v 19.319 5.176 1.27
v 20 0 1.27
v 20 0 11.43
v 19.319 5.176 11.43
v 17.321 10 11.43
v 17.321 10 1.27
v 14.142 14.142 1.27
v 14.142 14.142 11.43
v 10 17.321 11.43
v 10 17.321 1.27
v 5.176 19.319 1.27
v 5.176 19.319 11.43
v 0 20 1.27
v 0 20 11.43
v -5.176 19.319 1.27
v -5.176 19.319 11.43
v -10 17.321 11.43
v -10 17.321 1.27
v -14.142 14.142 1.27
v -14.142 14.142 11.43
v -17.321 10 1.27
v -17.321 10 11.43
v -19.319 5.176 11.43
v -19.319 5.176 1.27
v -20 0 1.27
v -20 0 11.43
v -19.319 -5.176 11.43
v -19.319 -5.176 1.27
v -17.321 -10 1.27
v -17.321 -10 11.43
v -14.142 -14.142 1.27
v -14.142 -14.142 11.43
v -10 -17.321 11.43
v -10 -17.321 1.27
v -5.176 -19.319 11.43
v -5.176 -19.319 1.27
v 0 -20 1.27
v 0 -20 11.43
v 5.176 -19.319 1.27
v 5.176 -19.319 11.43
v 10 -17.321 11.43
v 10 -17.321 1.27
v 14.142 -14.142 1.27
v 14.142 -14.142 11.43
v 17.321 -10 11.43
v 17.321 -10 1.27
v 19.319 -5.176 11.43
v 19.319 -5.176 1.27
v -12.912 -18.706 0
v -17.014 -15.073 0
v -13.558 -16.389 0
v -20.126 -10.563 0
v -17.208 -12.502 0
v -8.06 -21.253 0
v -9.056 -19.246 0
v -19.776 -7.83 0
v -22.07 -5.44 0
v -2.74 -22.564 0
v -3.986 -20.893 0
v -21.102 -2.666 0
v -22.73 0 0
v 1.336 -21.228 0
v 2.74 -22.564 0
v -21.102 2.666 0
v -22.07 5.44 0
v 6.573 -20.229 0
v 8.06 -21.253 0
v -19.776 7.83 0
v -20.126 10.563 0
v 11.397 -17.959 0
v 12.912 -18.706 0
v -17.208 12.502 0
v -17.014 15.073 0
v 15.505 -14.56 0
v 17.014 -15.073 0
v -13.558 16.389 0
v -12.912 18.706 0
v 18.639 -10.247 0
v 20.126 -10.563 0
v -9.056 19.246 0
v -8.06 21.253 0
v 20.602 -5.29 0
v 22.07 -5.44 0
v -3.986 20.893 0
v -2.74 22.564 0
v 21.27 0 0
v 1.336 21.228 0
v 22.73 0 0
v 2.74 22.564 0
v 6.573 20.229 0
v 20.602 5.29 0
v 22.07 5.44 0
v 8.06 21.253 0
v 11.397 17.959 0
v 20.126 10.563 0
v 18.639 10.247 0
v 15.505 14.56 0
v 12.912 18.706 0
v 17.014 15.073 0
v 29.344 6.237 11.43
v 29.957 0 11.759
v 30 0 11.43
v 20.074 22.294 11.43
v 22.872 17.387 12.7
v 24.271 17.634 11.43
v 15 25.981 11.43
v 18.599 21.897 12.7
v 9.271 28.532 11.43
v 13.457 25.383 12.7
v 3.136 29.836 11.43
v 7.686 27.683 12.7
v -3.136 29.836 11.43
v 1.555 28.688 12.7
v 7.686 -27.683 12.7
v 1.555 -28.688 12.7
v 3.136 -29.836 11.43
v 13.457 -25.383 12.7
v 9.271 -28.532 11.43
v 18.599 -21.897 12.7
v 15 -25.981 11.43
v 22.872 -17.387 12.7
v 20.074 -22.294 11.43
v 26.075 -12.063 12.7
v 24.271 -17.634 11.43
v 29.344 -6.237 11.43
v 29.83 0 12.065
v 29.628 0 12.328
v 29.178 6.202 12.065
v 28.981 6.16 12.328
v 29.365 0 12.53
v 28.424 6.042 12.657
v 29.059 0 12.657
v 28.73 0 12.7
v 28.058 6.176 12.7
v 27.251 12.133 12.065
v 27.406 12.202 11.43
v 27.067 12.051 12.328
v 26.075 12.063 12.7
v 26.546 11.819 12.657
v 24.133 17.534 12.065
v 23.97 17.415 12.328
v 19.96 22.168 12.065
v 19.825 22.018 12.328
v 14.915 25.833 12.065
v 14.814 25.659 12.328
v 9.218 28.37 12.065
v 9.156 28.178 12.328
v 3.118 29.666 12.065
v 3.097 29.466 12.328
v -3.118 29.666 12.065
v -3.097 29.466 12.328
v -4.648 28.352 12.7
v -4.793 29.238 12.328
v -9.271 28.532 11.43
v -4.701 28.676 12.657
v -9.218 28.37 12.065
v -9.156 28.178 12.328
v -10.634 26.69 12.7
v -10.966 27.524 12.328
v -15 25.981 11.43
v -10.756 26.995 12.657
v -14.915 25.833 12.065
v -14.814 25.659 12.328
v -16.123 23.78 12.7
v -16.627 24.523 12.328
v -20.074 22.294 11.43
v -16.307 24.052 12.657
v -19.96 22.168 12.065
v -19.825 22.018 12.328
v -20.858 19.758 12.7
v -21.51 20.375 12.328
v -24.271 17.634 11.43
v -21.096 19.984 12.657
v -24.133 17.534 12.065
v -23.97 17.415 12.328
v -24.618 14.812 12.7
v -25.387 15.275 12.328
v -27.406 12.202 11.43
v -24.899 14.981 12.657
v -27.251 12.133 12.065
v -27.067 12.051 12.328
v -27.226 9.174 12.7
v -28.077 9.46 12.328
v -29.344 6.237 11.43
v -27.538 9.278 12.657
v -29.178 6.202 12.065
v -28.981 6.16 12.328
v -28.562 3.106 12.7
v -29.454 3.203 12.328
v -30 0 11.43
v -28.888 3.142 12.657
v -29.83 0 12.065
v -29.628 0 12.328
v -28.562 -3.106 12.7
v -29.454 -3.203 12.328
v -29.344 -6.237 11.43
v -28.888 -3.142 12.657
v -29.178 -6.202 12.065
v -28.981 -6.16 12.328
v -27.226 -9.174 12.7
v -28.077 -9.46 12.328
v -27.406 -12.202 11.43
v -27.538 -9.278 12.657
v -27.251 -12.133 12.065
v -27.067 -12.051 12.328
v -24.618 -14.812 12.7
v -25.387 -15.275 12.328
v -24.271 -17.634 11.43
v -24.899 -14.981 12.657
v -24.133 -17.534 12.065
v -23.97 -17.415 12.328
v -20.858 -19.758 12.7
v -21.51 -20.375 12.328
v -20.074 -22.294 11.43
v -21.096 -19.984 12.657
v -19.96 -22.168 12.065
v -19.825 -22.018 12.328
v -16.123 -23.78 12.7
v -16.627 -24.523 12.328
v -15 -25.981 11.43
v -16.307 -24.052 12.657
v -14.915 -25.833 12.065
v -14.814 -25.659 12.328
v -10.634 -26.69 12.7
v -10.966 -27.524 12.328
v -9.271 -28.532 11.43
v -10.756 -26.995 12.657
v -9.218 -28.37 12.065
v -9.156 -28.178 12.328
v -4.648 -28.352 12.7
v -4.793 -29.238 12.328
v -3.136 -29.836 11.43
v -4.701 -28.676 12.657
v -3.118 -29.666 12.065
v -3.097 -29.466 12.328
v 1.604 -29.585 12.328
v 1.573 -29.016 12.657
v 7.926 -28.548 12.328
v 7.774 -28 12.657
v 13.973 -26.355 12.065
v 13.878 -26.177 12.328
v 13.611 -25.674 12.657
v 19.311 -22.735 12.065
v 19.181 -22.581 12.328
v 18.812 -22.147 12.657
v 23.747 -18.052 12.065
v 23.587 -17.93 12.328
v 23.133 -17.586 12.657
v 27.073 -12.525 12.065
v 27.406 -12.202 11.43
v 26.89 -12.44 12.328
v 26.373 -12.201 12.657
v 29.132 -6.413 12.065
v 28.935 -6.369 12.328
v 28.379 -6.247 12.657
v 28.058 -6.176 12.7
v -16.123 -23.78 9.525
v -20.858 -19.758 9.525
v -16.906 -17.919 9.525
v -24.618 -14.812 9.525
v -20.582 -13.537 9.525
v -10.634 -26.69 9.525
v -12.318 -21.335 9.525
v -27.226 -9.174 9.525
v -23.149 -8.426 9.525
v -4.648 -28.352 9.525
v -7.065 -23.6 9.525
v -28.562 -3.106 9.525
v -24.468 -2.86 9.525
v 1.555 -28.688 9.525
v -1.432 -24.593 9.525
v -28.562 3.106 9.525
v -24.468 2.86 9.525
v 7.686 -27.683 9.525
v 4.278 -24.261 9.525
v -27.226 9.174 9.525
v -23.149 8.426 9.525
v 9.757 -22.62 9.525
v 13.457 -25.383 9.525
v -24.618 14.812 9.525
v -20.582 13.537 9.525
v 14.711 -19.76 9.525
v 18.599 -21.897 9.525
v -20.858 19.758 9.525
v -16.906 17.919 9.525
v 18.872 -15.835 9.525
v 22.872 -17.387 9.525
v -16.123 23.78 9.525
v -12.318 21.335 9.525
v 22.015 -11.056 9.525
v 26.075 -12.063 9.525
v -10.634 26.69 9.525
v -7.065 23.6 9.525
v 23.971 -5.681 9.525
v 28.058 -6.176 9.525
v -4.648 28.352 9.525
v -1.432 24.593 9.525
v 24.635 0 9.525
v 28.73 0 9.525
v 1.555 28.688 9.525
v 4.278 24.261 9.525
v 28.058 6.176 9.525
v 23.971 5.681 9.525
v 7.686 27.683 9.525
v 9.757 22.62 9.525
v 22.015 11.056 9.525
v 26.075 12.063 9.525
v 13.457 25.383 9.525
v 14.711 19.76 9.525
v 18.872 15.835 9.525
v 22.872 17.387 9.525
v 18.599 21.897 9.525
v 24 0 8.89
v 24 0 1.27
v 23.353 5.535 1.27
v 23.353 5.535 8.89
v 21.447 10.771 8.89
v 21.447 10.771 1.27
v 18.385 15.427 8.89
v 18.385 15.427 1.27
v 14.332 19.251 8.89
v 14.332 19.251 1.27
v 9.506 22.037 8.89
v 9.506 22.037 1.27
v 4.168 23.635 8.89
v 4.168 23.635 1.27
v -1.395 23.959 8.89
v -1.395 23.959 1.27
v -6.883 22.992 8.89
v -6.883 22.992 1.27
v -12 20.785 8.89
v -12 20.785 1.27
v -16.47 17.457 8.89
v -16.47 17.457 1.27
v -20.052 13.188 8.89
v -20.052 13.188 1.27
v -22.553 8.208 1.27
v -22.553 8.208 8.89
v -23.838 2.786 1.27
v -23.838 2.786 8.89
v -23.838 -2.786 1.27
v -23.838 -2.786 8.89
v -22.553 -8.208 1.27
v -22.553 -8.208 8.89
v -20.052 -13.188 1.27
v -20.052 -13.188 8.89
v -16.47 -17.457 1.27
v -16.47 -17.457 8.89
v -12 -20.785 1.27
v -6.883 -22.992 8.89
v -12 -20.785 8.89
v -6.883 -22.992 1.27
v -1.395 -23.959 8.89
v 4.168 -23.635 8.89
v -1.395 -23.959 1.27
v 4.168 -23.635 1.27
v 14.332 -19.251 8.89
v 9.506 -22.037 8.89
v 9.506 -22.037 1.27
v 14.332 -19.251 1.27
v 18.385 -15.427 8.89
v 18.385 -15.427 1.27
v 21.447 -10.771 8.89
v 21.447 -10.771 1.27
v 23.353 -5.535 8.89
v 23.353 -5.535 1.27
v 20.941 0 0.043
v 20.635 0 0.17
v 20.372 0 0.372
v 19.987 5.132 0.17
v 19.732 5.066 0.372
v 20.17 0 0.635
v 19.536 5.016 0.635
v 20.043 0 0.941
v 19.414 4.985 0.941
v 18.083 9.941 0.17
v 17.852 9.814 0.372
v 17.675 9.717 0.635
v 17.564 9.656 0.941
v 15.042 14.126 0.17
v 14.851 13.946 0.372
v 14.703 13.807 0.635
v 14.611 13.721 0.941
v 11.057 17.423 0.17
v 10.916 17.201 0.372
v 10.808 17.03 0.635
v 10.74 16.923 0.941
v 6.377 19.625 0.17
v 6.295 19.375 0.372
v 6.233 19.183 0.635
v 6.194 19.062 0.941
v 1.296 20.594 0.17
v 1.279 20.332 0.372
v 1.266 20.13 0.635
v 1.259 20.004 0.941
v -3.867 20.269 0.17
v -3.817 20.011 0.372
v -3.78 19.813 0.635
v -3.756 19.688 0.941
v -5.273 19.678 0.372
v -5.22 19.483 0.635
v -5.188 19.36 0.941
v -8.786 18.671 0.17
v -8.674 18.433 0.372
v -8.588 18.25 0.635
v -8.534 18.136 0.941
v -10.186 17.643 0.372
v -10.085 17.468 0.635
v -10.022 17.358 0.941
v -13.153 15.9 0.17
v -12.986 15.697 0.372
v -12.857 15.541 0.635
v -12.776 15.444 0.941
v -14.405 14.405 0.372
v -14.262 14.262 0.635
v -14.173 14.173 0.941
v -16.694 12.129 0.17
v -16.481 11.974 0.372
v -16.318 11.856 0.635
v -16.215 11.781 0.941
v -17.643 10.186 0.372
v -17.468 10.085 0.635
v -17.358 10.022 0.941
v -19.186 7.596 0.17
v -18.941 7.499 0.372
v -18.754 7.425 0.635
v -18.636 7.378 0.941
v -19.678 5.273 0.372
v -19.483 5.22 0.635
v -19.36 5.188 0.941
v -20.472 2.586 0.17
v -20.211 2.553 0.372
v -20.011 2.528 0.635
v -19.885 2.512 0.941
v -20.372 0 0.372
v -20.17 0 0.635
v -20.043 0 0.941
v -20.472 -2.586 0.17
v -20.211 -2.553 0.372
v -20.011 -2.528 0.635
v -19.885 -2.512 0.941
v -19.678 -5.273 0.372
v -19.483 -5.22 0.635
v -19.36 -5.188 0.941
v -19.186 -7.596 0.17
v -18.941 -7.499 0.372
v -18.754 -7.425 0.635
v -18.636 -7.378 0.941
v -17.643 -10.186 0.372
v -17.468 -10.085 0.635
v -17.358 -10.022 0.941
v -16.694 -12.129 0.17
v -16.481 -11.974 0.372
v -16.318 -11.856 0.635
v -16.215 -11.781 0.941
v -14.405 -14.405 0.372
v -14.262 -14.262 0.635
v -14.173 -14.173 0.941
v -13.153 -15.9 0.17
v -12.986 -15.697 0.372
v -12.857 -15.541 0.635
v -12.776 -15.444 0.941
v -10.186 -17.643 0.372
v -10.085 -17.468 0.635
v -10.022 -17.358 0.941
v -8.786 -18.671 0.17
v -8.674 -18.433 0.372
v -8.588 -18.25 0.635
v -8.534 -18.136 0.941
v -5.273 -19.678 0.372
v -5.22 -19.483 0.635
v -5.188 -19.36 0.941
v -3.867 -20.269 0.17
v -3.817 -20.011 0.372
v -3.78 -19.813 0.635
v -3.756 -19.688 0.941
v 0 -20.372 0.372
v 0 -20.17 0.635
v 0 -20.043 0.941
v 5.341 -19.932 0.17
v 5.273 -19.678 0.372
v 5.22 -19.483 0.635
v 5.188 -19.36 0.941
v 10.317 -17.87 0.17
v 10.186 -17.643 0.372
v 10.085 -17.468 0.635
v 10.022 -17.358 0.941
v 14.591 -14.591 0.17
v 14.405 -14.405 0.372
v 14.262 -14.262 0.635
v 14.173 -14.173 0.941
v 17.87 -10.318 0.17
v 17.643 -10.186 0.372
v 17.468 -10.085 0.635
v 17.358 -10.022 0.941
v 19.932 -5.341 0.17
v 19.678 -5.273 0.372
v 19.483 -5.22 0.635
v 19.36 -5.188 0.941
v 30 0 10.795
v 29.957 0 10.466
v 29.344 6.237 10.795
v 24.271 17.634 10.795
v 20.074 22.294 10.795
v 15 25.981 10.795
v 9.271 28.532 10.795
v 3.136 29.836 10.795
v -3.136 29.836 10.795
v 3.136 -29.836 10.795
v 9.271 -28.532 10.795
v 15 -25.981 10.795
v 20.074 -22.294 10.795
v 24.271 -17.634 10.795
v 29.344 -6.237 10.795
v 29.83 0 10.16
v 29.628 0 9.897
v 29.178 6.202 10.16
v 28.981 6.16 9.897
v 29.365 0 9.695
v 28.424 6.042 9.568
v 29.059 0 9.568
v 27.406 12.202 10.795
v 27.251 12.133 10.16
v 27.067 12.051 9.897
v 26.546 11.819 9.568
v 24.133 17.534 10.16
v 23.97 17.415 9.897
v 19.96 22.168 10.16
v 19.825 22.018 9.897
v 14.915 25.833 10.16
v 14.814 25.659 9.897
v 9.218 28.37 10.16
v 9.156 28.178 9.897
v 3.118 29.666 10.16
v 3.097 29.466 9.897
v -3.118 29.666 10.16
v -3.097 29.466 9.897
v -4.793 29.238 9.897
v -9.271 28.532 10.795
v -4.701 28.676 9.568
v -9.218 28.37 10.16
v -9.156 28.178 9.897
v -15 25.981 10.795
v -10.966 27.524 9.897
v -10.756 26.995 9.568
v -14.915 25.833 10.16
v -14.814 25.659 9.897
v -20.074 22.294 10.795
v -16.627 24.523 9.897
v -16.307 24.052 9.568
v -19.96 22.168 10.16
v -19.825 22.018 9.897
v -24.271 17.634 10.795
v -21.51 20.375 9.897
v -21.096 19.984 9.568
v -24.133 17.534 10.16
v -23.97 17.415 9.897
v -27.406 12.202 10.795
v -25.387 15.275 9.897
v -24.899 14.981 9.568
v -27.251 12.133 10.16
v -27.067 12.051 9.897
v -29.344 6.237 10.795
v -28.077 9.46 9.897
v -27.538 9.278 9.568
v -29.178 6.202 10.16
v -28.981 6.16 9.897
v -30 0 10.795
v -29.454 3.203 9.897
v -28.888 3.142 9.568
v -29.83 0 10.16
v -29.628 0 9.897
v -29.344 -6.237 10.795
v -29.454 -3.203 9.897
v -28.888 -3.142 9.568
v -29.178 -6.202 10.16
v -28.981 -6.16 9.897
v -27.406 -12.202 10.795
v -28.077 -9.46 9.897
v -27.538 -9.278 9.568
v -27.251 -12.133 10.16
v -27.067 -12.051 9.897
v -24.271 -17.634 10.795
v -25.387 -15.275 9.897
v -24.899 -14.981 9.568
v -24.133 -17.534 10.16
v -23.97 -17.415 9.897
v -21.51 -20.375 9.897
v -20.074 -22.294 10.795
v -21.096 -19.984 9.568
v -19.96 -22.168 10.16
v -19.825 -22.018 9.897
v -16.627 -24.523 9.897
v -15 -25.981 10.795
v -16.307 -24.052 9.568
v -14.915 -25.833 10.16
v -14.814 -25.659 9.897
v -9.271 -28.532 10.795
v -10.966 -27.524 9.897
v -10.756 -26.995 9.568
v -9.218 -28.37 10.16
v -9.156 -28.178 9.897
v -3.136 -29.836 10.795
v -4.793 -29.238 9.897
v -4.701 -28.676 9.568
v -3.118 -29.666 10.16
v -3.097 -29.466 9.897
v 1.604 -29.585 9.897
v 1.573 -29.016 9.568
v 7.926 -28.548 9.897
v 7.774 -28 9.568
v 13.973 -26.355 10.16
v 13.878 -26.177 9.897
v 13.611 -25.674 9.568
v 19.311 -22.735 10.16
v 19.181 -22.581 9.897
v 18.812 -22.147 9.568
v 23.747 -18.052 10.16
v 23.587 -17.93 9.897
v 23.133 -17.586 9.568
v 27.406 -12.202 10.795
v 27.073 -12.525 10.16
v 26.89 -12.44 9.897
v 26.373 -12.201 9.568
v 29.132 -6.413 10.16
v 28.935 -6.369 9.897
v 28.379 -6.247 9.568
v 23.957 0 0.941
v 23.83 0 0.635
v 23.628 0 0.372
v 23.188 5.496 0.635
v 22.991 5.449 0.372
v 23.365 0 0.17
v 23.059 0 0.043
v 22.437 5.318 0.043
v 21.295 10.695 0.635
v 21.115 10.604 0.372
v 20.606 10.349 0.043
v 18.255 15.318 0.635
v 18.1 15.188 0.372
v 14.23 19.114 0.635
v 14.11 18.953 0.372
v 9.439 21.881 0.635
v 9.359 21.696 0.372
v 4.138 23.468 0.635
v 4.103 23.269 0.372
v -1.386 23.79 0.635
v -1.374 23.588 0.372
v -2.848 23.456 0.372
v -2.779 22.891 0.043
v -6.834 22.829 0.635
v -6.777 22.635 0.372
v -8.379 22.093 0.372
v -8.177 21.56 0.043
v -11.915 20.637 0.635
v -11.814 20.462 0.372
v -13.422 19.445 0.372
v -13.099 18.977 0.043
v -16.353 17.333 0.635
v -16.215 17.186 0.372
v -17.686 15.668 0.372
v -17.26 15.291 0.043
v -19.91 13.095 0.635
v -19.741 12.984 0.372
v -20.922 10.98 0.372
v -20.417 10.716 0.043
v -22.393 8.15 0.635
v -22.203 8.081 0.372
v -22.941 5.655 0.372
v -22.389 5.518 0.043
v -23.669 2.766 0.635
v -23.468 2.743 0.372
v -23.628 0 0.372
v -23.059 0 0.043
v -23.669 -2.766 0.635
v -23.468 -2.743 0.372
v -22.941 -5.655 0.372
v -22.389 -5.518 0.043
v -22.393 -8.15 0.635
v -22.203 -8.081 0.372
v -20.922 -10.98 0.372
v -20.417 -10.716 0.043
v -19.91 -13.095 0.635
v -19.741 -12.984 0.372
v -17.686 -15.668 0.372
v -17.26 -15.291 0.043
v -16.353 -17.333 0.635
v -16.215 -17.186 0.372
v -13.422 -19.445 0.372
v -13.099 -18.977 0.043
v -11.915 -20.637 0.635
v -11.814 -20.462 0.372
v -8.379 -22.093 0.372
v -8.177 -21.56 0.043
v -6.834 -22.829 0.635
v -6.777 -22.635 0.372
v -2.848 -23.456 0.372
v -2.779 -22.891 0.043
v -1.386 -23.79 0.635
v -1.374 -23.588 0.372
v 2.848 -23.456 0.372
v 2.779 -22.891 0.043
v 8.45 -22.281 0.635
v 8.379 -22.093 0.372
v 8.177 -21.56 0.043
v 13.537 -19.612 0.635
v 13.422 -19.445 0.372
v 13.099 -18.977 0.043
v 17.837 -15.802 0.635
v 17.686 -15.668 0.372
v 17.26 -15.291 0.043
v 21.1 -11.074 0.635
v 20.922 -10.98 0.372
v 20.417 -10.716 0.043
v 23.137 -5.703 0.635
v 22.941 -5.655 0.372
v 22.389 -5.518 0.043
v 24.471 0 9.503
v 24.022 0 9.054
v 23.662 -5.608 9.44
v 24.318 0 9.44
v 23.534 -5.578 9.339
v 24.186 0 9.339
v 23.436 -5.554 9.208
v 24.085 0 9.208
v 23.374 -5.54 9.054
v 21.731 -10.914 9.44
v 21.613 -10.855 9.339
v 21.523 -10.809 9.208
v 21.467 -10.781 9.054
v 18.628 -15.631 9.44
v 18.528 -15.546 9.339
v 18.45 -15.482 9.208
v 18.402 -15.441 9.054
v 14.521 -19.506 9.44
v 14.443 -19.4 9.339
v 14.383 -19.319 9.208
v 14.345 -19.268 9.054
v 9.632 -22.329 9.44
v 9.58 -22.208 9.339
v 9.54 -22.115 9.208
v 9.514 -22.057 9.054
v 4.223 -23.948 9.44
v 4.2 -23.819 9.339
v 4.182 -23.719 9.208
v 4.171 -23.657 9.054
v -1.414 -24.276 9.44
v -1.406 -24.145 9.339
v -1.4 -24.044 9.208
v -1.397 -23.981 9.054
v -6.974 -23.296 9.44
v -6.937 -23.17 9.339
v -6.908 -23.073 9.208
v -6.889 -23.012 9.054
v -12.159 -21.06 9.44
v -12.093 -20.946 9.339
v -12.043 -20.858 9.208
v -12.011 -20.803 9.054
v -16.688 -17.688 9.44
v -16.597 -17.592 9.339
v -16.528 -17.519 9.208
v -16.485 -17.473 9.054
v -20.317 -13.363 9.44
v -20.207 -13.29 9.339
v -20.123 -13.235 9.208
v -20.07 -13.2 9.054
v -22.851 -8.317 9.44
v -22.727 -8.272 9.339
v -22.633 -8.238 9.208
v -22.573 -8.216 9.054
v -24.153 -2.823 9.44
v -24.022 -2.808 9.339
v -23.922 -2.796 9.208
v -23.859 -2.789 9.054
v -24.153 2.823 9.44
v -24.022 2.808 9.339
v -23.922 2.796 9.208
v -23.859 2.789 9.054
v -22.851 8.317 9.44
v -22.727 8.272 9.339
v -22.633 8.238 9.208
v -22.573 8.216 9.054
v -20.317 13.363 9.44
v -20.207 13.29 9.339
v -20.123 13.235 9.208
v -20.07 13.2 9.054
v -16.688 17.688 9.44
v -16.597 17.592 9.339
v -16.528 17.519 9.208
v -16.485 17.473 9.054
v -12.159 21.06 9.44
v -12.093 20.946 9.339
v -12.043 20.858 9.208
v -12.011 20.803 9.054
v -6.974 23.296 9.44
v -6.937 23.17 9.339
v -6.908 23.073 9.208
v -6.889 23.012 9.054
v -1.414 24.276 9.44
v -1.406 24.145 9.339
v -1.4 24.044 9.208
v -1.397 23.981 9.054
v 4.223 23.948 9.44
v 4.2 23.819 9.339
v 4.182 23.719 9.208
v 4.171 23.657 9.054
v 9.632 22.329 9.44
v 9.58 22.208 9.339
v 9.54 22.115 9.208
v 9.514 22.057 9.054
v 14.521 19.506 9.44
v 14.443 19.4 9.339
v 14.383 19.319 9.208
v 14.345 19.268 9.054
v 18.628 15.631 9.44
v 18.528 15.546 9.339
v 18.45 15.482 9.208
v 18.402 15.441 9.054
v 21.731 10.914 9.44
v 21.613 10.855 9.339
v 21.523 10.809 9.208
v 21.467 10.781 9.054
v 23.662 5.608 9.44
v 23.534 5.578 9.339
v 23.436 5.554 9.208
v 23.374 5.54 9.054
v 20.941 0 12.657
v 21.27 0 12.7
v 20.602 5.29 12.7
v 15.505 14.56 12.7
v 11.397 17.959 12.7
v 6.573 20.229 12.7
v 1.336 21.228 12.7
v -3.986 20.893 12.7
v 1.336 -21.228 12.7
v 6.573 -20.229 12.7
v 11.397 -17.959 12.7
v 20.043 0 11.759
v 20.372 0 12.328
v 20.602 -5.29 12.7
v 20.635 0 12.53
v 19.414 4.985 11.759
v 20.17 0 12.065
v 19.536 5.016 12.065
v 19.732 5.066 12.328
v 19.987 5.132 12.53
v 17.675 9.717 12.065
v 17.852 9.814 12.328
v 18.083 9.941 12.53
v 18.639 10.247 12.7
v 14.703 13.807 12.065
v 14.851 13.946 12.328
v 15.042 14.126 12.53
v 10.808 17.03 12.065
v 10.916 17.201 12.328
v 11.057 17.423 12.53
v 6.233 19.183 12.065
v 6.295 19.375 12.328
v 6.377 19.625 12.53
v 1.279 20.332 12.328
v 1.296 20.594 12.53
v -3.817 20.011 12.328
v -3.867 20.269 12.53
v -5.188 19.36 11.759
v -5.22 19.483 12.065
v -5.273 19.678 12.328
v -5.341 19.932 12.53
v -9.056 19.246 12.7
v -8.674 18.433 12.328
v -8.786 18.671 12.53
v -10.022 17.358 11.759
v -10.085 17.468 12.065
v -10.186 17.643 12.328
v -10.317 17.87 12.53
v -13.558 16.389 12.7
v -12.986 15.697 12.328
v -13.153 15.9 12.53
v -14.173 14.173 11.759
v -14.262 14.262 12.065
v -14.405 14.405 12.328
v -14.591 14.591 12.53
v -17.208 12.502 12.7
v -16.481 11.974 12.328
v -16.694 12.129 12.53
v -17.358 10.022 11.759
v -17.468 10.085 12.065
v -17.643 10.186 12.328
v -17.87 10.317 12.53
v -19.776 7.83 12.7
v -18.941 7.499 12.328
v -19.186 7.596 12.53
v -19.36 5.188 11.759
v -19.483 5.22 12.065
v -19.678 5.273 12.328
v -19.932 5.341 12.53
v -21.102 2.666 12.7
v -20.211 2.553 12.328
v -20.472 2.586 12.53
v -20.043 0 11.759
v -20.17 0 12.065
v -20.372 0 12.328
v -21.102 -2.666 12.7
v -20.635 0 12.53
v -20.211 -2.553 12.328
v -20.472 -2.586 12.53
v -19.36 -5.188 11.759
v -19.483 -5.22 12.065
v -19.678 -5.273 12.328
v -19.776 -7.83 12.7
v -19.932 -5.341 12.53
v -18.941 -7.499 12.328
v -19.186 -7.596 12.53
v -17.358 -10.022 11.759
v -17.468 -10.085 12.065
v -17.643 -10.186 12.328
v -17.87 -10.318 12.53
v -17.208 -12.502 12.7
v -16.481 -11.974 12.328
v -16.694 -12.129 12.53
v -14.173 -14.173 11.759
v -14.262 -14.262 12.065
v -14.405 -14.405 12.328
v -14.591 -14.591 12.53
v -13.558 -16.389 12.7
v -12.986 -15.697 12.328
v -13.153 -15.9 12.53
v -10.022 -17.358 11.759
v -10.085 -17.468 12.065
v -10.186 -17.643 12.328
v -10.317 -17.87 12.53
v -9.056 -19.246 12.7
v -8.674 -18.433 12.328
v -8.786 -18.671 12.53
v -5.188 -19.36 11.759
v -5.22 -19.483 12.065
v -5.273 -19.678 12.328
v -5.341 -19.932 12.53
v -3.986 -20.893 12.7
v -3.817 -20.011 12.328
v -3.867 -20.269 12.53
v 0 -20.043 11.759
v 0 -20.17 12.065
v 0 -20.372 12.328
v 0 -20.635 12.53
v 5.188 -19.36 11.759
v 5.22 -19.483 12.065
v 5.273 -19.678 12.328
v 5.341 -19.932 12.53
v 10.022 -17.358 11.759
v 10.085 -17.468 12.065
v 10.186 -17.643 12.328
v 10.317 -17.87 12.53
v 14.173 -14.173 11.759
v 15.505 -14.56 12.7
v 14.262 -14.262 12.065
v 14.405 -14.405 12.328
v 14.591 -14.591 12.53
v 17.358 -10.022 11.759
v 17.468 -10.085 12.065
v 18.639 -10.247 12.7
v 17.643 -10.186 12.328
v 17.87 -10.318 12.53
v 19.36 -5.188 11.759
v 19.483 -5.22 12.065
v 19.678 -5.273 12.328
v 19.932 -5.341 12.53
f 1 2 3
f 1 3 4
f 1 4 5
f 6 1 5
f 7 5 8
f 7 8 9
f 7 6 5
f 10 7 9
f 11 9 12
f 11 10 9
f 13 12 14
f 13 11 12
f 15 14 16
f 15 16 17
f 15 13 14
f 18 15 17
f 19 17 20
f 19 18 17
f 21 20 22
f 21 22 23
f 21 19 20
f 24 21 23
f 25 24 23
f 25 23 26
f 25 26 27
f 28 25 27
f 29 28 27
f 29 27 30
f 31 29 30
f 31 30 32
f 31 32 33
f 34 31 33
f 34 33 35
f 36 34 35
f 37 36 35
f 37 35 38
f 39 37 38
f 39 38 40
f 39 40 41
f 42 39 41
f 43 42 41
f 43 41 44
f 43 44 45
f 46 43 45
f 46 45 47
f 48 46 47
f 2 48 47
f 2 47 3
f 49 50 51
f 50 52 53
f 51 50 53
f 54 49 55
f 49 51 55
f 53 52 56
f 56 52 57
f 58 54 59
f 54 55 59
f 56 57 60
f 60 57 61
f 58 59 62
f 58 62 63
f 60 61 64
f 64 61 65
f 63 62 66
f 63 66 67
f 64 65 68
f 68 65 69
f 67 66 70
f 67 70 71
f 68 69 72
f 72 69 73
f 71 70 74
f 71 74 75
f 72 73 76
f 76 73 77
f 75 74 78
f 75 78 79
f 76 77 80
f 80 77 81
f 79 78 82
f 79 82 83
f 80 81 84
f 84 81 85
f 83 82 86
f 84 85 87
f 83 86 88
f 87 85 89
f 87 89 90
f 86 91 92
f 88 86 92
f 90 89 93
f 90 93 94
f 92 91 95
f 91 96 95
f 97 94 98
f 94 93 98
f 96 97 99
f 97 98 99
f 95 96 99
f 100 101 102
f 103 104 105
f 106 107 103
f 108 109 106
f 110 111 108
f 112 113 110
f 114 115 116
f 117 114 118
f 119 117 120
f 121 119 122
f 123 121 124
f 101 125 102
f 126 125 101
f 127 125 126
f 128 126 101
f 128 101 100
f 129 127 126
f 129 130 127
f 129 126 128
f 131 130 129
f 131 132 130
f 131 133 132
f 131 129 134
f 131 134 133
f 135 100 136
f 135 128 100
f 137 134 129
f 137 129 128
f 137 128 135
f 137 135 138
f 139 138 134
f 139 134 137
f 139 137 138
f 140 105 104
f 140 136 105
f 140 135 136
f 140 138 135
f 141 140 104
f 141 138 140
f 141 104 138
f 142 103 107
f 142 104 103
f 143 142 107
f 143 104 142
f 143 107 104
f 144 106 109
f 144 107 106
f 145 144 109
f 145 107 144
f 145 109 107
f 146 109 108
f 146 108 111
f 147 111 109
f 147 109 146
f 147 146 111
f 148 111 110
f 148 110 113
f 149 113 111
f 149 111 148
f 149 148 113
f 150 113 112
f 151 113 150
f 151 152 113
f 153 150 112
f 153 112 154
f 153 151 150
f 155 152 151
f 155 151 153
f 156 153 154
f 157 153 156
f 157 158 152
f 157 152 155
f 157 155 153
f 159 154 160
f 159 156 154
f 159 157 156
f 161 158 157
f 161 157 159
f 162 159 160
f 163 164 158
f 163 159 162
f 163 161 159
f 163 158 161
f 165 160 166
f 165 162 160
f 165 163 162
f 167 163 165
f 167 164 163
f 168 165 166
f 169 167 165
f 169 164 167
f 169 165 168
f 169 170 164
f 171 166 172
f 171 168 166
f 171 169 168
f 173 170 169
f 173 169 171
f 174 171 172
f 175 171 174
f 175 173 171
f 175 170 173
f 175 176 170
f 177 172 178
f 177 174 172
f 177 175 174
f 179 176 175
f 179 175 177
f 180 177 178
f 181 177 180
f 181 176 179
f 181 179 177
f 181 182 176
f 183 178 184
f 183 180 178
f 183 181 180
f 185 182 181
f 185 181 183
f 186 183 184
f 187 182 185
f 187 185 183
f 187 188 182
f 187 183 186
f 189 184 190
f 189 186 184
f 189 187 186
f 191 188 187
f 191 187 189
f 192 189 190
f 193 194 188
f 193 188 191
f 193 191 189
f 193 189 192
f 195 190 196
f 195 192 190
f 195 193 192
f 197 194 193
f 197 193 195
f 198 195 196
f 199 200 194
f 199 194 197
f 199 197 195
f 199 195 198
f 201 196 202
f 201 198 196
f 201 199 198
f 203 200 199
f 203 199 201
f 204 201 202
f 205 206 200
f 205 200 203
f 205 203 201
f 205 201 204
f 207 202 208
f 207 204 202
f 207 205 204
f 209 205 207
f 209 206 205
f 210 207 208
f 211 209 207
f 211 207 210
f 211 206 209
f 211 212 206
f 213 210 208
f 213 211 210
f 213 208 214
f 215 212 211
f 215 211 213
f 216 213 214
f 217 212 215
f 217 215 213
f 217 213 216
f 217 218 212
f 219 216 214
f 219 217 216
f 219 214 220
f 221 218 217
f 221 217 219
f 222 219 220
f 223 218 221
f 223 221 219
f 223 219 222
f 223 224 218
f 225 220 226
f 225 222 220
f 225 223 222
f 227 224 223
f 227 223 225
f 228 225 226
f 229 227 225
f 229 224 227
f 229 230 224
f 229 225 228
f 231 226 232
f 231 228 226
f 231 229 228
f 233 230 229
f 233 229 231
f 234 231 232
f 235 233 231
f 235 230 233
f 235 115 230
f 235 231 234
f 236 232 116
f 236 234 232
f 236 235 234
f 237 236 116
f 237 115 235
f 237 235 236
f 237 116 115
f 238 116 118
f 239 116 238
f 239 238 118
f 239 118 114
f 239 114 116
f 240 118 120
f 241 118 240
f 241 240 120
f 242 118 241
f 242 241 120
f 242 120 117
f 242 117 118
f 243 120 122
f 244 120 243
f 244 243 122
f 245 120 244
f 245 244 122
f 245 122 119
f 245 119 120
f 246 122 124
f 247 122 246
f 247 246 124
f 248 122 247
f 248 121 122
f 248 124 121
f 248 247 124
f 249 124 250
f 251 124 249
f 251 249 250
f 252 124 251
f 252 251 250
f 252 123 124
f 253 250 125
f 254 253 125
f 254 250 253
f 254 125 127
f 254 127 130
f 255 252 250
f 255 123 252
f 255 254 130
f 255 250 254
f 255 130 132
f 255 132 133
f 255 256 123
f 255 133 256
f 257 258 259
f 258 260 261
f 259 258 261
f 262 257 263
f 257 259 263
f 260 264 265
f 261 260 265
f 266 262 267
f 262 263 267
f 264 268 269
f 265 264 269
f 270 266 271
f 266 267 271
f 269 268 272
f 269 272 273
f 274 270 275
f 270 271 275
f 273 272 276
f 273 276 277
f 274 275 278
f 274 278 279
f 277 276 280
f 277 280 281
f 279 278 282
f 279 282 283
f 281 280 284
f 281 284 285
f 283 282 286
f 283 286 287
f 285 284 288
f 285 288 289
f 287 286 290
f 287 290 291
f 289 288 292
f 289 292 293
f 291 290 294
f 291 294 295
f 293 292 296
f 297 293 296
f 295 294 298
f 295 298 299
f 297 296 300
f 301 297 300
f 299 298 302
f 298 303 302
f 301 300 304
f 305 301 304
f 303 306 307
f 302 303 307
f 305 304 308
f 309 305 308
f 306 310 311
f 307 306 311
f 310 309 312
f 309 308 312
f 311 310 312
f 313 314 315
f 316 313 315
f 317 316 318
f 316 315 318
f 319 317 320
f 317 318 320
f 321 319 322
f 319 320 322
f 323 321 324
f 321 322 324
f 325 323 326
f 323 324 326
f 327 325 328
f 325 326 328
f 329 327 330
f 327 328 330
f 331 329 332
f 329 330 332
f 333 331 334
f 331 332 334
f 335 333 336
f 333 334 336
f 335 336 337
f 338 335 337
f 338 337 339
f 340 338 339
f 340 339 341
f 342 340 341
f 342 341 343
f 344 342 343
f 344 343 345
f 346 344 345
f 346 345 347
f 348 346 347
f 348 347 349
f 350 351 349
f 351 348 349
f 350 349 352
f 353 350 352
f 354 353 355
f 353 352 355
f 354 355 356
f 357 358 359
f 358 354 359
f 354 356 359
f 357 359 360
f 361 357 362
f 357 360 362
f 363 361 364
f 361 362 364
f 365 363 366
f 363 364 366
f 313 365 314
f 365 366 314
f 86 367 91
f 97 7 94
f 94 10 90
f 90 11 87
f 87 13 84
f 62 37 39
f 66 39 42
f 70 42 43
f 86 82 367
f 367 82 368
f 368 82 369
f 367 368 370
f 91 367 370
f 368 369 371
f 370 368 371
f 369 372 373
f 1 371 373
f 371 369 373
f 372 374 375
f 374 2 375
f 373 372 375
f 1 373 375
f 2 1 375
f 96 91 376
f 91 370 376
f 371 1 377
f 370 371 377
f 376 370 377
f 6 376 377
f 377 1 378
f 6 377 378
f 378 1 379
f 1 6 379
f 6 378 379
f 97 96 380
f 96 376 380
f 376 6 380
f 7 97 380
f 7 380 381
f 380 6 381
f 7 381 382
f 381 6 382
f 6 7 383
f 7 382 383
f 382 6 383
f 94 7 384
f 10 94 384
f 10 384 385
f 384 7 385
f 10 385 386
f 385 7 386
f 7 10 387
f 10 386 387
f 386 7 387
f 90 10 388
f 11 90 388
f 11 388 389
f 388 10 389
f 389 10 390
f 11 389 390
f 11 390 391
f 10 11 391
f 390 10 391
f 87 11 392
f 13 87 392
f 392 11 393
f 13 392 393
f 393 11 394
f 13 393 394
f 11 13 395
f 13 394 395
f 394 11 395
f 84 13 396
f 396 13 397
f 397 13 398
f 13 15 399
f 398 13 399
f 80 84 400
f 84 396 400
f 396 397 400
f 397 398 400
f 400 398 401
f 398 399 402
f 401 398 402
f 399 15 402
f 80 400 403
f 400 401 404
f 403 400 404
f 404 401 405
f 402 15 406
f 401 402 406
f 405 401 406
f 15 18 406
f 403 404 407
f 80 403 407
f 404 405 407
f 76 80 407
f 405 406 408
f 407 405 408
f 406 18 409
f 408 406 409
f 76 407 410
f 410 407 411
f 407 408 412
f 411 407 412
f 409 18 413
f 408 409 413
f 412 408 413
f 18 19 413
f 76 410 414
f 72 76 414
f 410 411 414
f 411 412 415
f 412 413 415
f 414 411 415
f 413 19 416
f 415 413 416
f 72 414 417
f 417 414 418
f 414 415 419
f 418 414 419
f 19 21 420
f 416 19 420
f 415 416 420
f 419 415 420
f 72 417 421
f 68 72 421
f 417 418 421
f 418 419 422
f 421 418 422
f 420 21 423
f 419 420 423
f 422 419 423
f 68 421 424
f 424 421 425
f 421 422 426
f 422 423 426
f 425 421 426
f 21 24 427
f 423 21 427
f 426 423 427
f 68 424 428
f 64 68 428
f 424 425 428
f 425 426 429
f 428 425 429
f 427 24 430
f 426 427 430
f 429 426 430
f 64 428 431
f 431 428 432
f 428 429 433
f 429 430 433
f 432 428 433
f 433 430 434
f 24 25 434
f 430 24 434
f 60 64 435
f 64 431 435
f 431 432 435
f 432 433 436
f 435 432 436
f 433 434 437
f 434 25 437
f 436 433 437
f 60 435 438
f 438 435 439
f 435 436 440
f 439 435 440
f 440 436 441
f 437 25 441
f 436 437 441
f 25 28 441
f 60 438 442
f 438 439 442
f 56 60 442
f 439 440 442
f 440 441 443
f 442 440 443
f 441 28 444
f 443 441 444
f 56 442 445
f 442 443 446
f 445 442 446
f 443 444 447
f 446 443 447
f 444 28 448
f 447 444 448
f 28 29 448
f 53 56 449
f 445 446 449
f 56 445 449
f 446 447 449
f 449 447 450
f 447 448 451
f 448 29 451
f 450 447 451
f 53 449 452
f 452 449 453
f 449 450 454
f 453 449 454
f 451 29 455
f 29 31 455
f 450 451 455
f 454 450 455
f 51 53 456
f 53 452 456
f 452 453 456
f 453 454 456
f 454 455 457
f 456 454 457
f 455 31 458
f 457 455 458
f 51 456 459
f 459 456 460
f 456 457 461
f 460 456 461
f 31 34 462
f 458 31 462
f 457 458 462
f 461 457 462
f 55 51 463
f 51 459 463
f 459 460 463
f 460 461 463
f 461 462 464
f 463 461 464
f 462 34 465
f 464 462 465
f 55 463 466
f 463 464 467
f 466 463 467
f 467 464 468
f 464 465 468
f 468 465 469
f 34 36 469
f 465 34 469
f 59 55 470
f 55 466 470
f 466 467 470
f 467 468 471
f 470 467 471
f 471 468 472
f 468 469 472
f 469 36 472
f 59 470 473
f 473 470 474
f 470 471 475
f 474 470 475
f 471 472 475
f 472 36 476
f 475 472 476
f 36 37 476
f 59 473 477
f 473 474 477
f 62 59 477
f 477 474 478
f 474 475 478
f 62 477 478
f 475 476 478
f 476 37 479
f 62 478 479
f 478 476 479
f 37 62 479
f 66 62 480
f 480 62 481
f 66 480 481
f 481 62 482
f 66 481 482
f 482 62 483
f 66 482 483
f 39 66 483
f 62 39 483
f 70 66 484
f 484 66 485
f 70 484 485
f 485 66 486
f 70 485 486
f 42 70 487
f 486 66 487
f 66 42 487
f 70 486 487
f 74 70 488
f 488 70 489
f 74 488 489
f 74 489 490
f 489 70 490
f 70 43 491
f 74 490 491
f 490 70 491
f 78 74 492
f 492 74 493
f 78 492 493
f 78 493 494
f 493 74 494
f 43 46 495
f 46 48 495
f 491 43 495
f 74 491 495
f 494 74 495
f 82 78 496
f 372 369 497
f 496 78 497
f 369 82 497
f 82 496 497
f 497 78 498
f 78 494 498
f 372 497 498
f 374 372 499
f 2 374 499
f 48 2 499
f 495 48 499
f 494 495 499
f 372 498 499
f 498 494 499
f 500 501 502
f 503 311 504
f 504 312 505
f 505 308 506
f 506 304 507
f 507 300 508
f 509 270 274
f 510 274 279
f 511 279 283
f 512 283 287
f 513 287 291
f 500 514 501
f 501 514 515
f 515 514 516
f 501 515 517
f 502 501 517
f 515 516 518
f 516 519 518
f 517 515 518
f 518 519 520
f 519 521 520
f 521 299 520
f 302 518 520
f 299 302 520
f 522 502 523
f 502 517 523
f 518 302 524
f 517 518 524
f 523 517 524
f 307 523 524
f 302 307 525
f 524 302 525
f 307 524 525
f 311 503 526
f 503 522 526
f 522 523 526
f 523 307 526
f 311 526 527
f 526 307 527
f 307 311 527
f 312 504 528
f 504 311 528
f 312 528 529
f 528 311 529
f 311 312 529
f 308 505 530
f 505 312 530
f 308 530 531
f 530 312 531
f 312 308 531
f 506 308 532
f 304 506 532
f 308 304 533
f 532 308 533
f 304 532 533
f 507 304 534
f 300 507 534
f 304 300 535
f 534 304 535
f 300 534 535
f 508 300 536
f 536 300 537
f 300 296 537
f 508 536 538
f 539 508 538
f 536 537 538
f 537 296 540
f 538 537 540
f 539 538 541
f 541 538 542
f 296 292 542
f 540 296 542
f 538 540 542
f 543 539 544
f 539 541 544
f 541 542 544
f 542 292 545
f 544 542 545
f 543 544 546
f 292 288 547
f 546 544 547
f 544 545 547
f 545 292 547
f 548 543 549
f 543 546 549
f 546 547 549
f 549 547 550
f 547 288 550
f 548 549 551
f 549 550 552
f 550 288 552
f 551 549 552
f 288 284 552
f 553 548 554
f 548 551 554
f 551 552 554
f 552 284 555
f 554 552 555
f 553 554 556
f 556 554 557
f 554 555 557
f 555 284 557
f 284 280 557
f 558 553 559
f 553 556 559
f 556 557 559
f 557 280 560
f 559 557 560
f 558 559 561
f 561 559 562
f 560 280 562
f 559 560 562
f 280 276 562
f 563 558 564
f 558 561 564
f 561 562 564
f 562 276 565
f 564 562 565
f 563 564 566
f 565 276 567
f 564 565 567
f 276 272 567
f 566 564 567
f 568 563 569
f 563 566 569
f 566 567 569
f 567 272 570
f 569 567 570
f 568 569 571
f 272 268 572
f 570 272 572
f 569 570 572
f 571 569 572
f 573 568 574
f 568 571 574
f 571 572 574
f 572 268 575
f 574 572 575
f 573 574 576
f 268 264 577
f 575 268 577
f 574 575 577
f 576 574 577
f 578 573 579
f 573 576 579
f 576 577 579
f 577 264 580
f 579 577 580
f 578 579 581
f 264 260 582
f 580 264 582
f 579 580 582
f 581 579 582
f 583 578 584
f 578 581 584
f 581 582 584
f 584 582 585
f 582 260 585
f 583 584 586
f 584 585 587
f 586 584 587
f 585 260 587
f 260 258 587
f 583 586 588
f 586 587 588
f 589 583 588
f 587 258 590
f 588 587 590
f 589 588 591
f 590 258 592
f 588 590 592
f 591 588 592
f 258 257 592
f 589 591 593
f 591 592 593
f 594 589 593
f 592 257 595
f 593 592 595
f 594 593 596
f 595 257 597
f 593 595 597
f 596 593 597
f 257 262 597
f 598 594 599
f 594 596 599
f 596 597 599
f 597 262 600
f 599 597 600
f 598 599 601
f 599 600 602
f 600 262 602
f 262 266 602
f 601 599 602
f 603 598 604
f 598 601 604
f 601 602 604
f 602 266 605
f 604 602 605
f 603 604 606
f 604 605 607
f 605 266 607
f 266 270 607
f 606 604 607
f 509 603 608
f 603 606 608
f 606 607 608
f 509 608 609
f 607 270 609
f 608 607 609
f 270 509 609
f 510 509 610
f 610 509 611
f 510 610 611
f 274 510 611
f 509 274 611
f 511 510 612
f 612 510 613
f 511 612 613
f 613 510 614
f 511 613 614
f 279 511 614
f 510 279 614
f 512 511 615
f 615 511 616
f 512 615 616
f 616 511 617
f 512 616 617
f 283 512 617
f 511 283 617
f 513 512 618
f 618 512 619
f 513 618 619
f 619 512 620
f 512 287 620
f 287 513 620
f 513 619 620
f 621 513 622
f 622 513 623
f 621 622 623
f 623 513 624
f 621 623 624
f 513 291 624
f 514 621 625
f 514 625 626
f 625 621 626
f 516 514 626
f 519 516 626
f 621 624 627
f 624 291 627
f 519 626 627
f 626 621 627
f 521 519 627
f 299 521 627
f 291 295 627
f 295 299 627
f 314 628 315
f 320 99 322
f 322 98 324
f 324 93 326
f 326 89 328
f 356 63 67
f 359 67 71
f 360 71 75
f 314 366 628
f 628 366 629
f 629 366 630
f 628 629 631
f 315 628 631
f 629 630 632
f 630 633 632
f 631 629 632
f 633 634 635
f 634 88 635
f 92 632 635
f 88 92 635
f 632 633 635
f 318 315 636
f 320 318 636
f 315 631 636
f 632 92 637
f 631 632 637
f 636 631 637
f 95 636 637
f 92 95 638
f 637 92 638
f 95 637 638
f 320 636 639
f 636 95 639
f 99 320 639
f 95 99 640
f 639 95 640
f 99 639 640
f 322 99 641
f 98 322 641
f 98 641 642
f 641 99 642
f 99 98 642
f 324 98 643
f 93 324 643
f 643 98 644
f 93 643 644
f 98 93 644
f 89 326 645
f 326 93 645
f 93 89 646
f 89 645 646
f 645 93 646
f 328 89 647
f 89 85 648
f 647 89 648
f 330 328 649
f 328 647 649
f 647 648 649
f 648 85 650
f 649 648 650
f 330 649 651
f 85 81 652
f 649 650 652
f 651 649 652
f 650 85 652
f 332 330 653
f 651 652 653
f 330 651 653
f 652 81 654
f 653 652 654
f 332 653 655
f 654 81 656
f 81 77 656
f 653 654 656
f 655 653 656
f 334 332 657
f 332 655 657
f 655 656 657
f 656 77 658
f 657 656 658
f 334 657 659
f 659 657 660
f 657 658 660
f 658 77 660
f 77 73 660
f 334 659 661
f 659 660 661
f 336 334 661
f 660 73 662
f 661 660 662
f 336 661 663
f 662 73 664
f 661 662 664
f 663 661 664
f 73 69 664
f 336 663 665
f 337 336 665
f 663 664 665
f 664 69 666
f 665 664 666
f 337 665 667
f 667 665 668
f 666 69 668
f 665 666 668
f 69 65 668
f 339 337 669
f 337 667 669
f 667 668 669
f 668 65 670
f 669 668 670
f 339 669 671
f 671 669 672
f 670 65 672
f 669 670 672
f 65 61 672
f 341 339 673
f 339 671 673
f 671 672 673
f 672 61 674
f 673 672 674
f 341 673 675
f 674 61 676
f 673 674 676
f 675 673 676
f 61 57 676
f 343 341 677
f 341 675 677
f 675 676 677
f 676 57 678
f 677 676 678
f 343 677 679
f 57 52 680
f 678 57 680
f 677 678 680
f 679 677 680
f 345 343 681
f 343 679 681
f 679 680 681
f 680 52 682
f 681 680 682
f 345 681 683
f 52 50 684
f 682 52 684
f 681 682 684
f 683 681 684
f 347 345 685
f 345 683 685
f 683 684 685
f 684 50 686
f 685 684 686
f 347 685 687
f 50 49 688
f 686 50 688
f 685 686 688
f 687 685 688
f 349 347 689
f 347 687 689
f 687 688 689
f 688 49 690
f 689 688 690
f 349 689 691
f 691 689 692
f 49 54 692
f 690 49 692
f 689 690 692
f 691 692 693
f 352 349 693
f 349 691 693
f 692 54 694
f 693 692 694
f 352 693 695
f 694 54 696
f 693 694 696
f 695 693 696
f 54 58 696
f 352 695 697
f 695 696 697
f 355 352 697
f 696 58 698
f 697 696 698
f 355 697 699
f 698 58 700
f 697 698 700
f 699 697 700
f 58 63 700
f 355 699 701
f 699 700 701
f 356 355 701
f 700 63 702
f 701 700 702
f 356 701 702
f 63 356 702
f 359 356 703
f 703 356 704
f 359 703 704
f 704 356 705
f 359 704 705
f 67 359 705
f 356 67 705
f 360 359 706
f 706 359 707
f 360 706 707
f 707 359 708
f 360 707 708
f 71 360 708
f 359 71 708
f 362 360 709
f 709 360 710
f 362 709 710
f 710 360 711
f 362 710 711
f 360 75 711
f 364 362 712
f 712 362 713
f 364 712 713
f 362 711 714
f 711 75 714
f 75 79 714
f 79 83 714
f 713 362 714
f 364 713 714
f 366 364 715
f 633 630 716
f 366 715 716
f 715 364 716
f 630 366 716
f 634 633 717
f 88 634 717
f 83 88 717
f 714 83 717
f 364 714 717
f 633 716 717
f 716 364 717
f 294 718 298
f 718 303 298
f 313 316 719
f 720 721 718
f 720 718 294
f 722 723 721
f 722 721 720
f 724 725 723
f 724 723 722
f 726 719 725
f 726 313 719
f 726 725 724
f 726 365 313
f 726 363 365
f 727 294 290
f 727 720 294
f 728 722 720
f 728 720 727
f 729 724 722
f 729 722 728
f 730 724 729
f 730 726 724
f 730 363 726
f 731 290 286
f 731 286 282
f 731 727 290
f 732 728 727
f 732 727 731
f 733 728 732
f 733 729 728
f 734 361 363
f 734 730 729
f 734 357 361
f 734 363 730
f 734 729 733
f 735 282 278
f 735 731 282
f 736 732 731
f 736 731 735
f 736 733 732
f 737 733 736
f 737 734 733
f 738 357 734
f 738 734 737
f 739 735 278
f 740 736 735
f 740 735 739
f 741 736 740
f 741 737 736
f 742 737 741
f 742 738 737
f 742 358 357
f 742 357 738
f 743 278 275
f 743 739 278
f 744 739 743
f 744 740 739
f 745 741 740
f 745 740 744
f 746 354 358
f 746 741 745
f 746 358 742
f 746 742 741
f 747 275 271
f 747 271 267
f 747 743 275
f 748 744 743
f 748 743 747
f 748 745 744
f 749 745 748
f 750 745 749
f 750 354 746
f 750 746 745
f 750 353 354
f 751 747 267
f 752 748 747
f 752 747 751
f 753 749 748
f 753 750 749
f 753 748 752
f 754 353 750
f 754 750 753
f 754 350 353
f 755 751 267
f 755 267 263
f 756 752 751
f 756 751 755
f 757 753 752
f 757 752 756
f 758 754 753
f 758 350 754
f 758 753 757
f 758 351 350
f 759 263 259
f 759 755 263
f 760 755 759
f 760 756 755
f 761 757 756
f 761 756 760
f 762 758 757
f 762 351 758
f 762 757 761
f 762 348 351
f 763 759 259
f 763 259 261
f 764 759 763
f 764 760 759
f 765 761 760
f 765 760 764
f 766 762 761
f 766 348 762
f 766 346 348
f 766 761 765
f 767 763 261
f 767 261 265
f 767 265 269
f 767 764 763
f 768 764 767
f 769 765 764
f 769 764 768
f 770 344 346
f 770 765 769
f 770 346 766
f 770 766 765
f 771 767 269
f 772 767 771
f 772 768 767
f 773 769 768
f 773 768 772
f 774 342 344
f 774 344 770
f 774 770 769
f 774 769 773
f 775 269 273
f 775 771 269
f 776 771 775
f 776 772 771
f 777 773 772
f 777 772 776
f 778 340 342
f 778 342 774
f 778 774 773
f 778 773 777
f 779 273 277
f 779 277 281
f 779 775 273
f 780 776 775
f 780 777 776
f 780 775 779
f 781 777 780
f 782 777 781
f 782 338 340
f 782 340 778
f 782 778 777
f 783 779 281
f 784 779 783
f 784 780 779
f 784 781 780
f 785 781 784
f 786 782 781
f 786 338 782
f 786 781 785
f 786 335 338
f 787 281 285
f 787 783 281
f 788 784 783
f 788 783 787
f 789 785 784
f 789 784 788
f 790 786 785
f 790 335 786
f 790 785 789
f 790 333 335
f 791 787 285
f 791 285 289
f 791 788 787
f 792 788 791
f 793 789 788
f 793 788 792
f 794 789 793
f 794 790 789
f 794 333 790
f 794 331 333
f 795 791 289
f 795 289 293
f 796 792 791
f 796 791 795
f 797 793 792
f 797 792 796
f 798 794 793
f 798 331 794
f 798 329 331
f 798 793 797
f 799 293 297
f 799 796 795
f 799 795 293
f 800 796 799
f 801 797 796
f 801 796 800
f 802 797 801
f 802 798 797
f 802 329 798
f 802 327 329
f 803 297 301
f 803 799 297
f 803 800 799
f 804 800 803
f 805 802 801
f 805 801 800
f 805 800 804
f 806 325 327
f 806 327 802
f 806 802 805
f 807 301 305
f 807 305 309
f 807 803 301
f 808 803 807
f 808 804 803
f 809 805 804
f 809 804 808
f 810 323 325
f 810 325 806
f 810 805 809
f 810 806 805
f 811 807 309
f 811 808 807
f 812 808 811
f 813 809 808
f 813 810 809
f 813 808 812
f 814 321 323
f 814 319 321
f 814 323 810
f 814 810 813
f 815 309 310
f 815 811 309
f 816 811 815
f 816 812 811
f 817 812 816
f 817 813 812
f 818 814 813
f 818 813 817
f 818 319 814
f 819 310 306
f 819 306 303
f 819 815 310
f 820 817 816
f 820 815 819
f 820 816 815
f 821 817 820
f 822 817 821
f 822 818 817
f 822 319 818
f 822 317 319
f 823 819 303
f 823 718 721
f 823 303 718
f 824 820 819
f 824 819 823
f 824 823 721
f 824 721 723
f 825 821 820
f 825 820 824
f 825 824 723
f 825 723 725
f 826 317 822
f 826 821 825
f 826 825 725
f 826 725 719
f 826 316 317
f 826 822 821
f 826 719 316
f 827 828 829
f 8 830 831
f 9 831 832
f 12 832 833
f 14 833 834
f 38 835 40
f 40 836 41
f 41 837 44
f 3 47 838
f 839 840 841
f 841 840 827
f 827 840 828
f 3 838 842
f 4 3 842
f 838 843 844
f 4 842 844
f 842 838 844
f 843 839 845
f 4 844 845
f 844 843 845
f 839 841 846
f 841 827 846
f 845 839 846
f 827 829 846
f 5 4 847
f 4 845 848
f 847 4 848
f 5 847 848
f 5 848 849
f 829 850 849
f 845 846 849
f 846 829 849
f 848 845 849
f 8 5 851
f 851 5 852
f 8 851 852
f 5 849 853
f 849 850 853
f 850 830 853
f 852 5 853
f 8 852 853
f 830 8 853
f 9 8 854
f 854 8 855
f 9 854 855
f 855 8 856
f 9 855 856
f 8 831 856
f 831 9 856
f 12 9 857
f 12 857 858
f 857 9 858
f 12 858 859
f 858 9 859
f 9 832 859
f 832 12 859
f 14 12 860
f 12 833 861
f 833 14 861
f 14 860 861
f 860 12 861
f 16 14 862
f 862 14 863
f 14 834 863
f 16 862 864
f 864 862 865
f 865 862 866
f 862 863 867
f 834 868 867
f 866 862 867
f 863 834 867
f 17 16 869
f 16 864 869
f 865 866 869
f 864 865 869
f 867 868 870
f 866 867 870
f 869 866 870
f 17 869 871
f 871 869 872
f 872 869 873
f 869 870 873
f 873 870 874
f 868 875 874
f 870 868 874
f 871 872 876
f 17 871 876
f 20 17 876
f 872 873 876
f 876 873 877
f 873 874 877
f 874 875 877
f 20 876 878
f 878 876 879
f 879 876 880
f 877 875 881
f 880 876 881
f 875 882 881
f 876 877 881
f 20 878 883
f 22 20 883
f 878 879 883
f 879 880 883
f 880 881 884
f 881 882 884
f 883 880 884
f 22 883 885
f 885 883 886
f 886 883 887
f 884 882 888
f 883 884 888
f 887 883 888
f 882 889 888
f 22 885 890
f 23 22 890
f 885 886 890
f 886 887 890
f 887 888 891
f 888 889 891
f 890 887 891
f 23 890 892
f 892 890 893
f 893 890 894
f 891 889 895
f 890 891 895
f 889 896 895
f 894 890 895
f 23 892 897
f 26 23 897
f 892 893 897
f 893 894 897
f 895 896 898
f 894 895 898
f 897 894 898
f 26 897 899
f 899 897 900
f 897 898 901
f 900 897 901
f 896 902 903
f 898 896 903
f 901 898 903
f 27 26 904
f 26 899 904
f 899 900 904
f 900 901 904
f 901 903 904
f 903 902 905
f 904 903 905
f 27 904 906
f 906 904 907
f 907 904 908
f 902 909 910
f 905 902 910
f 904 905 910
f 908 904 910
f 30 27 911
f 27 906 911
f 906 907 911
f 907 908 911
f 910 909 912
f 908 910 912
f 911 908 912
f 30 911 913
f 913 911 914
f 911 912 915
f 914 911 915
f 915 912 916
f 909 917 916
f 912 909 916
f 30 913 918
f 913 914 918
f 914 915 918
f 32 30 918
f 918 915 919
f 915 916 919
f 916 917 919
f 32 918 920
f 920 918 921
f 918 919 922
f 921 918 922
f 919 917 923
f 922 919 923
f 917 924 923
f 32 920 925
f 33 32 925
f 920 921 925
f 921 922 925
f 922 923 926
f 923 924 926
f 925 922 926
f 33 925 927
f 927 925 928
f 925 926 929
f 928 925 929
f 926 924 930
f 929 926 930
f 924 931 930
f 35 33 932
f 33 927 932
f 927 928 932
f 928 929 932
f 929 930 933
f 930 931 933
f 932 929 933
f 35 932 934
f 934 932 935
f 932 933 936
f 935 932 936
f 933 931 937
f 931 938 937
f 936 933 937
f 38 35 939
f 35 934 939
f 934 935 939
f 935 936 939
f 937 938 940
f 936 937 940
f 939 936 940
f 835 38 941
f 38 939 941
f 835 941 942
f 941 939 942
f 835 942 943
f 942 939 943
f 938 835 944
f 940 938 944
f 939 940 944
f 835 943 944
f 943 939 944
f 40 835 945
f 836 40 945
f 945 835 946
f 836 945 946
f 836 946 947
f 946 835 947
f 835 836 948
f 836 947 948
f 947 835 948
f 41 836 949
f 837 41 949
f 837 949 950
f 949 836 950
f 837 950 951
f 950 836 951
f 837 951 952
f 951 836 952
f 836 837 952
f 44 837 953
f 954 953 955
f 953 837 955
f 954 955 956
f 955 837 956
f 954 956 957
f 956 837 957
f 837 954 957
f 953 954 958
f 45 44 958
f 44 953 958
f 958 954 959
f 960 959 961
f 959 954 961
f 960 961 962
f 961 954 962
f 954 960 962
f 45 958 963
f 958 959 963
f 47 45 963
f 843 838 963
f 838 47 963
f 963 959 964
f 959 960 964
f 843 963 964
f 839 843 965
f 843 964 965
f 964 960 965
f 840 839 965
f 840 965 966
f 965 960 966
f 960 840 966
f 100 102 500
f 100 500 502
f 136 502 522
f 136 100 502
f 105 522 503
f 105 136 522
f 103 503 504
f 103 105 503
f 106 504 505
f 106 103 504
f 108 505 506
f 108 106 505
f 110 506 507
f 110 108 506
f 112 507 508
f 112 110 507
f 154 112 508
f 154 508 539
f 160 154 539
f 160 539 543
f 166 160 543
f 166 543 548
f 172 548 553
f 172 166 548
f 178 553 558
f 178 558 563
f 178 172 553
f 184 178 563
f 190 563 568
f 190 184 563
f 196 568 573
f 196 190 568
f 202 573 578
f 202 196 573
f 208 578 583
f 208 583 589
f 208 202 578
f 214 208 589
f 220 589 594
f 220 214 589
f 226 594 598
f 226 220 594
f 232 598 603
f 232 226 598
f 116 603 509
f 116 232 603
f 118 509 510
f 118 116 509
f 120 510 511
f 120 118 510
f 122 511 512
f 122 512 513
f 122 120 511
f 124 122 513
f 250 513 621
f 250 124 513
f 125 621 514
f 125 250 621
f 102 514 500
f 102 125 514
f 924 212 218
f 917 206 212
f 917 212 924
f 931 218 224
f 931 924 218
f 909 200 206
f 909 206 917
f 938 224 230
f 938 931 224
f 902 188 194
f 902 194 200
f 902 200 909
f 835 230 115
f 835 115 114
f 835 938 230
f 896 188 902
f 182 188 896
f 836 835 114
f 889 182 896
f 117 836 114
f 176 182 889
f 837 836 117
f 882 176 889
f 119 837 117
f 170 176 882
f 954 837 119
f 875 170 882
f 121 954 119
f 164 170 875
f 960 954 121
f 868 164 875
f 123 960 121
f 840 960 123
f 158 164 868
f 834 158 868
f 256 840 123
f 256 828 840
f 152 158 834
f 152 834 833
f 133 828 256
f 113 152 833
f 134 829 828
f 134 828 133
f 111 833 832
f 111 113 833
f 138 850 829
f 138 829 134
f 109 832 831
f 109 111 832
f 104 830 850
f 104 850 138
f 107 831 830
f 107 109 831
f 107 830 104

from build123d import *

# Parameters (mm, degrees)
F0_R     = 24
F0_R_2   = 20
F1_DEPTH = 12.7
F2_R     = 30
F2_R_2   = 20
F3_DEPTH = 3.175
F4_R     = 1.27
F5_R     = 0.635


with BuildPart() as f1:
    # F0 (on Top) → F1 (new body)
    with BuildSketch(Plane.XY):
        Circle(F0_R)
        Circle(F0_R_2, mode=Mode.SUBTRACT)
    extrude(amount=F1_DEPTH)

    # F2 (on face) → F3 (join)
    with BuildSketch(Plane.XY.offset(12.7)):
        Circle(F2_R)
        Circle(F2_R_2, mode=Mode.SUBTRACT)
    extrude(amount=-F3_DEPTH)

    # F4
    f4_edges = [f1.edges().sort_by_distance(p)[0] for p in [
        (-20, 0, 12.7),
        (-20, 0, 0),
        (-30, 0, 12.7),
        (-30, 0, 9.525),
        (-24, 0, 0),
    ]]
    fillet(f4_edges, radius=F4_R)

    # F5
    f5_edges = [f1.edges().sort_by_distance(p)[0] for p in [
        (-24, 0, 9.525),
    ]]
    fillet(f5_edges, radius=F5_R)


solid = f1.part
